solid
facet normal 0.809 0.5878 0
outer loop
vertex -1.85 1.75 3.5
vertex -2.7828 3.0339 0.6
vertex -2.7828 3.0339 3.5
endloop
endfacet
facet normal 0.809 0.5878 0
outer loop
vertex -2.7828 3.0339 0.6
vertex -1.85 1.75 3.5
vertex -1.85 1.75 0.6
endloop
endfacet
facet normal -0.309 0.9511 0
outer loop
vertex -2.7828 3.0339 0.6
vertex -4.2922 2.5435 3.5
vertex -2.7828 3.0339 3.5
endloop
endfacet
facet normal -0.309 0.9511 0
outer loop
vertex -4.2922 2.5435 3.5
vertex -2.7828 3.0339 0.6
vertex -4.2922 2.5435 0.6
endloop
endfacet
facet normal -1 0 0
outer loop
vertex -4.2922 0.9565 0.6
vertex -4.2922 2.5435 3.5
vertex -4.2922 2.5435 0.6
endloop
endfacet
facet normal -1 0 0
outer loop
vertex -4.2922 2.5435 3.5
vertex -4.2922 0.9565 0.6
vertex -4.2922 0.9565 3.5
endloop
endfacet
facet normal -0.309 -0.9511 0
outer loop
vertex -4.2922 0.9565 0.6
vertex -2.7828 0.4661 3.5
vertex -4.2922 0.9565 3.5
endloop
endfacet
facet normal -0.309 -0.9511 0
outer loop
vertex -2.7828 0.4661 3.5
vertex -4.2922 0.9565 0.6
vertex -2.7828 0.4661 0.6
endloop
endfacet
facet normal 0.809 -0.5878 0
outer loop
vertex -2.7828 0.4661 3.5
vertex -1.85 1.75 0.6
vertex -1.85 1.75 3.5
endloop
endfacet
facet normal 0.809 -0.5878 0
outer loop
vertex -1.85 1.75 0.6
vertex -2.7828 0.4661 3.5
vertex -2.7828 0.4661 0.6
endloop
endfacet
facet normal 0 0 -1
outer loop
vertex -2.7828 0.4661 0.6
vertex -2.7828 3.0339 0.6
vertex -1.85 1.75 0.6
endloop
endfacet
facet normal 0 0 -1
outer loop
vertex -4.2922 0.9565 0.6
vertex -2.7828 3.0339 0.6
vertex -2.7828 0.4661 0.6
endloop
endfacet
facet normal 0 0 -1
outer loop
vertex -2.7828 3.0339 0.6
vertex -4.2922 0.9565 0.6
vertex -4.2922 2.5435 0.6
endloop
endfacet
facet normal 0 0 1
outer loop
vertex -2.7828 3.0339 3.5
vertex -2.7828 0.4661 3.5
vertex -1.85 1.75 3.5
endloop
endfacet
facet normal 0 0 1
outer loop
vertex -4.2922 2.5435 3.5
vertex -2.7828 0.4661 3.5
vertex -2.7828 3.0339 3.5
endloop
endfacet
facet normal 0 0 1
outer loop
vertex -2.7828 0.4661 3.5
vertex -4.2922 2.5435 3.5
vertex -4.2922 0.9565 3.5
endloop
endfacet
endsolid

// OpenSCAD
union() {
  translate([-3.2, 1.75, 0.6]) cylinder(h=2.9, r=1.35, center=false);
}
